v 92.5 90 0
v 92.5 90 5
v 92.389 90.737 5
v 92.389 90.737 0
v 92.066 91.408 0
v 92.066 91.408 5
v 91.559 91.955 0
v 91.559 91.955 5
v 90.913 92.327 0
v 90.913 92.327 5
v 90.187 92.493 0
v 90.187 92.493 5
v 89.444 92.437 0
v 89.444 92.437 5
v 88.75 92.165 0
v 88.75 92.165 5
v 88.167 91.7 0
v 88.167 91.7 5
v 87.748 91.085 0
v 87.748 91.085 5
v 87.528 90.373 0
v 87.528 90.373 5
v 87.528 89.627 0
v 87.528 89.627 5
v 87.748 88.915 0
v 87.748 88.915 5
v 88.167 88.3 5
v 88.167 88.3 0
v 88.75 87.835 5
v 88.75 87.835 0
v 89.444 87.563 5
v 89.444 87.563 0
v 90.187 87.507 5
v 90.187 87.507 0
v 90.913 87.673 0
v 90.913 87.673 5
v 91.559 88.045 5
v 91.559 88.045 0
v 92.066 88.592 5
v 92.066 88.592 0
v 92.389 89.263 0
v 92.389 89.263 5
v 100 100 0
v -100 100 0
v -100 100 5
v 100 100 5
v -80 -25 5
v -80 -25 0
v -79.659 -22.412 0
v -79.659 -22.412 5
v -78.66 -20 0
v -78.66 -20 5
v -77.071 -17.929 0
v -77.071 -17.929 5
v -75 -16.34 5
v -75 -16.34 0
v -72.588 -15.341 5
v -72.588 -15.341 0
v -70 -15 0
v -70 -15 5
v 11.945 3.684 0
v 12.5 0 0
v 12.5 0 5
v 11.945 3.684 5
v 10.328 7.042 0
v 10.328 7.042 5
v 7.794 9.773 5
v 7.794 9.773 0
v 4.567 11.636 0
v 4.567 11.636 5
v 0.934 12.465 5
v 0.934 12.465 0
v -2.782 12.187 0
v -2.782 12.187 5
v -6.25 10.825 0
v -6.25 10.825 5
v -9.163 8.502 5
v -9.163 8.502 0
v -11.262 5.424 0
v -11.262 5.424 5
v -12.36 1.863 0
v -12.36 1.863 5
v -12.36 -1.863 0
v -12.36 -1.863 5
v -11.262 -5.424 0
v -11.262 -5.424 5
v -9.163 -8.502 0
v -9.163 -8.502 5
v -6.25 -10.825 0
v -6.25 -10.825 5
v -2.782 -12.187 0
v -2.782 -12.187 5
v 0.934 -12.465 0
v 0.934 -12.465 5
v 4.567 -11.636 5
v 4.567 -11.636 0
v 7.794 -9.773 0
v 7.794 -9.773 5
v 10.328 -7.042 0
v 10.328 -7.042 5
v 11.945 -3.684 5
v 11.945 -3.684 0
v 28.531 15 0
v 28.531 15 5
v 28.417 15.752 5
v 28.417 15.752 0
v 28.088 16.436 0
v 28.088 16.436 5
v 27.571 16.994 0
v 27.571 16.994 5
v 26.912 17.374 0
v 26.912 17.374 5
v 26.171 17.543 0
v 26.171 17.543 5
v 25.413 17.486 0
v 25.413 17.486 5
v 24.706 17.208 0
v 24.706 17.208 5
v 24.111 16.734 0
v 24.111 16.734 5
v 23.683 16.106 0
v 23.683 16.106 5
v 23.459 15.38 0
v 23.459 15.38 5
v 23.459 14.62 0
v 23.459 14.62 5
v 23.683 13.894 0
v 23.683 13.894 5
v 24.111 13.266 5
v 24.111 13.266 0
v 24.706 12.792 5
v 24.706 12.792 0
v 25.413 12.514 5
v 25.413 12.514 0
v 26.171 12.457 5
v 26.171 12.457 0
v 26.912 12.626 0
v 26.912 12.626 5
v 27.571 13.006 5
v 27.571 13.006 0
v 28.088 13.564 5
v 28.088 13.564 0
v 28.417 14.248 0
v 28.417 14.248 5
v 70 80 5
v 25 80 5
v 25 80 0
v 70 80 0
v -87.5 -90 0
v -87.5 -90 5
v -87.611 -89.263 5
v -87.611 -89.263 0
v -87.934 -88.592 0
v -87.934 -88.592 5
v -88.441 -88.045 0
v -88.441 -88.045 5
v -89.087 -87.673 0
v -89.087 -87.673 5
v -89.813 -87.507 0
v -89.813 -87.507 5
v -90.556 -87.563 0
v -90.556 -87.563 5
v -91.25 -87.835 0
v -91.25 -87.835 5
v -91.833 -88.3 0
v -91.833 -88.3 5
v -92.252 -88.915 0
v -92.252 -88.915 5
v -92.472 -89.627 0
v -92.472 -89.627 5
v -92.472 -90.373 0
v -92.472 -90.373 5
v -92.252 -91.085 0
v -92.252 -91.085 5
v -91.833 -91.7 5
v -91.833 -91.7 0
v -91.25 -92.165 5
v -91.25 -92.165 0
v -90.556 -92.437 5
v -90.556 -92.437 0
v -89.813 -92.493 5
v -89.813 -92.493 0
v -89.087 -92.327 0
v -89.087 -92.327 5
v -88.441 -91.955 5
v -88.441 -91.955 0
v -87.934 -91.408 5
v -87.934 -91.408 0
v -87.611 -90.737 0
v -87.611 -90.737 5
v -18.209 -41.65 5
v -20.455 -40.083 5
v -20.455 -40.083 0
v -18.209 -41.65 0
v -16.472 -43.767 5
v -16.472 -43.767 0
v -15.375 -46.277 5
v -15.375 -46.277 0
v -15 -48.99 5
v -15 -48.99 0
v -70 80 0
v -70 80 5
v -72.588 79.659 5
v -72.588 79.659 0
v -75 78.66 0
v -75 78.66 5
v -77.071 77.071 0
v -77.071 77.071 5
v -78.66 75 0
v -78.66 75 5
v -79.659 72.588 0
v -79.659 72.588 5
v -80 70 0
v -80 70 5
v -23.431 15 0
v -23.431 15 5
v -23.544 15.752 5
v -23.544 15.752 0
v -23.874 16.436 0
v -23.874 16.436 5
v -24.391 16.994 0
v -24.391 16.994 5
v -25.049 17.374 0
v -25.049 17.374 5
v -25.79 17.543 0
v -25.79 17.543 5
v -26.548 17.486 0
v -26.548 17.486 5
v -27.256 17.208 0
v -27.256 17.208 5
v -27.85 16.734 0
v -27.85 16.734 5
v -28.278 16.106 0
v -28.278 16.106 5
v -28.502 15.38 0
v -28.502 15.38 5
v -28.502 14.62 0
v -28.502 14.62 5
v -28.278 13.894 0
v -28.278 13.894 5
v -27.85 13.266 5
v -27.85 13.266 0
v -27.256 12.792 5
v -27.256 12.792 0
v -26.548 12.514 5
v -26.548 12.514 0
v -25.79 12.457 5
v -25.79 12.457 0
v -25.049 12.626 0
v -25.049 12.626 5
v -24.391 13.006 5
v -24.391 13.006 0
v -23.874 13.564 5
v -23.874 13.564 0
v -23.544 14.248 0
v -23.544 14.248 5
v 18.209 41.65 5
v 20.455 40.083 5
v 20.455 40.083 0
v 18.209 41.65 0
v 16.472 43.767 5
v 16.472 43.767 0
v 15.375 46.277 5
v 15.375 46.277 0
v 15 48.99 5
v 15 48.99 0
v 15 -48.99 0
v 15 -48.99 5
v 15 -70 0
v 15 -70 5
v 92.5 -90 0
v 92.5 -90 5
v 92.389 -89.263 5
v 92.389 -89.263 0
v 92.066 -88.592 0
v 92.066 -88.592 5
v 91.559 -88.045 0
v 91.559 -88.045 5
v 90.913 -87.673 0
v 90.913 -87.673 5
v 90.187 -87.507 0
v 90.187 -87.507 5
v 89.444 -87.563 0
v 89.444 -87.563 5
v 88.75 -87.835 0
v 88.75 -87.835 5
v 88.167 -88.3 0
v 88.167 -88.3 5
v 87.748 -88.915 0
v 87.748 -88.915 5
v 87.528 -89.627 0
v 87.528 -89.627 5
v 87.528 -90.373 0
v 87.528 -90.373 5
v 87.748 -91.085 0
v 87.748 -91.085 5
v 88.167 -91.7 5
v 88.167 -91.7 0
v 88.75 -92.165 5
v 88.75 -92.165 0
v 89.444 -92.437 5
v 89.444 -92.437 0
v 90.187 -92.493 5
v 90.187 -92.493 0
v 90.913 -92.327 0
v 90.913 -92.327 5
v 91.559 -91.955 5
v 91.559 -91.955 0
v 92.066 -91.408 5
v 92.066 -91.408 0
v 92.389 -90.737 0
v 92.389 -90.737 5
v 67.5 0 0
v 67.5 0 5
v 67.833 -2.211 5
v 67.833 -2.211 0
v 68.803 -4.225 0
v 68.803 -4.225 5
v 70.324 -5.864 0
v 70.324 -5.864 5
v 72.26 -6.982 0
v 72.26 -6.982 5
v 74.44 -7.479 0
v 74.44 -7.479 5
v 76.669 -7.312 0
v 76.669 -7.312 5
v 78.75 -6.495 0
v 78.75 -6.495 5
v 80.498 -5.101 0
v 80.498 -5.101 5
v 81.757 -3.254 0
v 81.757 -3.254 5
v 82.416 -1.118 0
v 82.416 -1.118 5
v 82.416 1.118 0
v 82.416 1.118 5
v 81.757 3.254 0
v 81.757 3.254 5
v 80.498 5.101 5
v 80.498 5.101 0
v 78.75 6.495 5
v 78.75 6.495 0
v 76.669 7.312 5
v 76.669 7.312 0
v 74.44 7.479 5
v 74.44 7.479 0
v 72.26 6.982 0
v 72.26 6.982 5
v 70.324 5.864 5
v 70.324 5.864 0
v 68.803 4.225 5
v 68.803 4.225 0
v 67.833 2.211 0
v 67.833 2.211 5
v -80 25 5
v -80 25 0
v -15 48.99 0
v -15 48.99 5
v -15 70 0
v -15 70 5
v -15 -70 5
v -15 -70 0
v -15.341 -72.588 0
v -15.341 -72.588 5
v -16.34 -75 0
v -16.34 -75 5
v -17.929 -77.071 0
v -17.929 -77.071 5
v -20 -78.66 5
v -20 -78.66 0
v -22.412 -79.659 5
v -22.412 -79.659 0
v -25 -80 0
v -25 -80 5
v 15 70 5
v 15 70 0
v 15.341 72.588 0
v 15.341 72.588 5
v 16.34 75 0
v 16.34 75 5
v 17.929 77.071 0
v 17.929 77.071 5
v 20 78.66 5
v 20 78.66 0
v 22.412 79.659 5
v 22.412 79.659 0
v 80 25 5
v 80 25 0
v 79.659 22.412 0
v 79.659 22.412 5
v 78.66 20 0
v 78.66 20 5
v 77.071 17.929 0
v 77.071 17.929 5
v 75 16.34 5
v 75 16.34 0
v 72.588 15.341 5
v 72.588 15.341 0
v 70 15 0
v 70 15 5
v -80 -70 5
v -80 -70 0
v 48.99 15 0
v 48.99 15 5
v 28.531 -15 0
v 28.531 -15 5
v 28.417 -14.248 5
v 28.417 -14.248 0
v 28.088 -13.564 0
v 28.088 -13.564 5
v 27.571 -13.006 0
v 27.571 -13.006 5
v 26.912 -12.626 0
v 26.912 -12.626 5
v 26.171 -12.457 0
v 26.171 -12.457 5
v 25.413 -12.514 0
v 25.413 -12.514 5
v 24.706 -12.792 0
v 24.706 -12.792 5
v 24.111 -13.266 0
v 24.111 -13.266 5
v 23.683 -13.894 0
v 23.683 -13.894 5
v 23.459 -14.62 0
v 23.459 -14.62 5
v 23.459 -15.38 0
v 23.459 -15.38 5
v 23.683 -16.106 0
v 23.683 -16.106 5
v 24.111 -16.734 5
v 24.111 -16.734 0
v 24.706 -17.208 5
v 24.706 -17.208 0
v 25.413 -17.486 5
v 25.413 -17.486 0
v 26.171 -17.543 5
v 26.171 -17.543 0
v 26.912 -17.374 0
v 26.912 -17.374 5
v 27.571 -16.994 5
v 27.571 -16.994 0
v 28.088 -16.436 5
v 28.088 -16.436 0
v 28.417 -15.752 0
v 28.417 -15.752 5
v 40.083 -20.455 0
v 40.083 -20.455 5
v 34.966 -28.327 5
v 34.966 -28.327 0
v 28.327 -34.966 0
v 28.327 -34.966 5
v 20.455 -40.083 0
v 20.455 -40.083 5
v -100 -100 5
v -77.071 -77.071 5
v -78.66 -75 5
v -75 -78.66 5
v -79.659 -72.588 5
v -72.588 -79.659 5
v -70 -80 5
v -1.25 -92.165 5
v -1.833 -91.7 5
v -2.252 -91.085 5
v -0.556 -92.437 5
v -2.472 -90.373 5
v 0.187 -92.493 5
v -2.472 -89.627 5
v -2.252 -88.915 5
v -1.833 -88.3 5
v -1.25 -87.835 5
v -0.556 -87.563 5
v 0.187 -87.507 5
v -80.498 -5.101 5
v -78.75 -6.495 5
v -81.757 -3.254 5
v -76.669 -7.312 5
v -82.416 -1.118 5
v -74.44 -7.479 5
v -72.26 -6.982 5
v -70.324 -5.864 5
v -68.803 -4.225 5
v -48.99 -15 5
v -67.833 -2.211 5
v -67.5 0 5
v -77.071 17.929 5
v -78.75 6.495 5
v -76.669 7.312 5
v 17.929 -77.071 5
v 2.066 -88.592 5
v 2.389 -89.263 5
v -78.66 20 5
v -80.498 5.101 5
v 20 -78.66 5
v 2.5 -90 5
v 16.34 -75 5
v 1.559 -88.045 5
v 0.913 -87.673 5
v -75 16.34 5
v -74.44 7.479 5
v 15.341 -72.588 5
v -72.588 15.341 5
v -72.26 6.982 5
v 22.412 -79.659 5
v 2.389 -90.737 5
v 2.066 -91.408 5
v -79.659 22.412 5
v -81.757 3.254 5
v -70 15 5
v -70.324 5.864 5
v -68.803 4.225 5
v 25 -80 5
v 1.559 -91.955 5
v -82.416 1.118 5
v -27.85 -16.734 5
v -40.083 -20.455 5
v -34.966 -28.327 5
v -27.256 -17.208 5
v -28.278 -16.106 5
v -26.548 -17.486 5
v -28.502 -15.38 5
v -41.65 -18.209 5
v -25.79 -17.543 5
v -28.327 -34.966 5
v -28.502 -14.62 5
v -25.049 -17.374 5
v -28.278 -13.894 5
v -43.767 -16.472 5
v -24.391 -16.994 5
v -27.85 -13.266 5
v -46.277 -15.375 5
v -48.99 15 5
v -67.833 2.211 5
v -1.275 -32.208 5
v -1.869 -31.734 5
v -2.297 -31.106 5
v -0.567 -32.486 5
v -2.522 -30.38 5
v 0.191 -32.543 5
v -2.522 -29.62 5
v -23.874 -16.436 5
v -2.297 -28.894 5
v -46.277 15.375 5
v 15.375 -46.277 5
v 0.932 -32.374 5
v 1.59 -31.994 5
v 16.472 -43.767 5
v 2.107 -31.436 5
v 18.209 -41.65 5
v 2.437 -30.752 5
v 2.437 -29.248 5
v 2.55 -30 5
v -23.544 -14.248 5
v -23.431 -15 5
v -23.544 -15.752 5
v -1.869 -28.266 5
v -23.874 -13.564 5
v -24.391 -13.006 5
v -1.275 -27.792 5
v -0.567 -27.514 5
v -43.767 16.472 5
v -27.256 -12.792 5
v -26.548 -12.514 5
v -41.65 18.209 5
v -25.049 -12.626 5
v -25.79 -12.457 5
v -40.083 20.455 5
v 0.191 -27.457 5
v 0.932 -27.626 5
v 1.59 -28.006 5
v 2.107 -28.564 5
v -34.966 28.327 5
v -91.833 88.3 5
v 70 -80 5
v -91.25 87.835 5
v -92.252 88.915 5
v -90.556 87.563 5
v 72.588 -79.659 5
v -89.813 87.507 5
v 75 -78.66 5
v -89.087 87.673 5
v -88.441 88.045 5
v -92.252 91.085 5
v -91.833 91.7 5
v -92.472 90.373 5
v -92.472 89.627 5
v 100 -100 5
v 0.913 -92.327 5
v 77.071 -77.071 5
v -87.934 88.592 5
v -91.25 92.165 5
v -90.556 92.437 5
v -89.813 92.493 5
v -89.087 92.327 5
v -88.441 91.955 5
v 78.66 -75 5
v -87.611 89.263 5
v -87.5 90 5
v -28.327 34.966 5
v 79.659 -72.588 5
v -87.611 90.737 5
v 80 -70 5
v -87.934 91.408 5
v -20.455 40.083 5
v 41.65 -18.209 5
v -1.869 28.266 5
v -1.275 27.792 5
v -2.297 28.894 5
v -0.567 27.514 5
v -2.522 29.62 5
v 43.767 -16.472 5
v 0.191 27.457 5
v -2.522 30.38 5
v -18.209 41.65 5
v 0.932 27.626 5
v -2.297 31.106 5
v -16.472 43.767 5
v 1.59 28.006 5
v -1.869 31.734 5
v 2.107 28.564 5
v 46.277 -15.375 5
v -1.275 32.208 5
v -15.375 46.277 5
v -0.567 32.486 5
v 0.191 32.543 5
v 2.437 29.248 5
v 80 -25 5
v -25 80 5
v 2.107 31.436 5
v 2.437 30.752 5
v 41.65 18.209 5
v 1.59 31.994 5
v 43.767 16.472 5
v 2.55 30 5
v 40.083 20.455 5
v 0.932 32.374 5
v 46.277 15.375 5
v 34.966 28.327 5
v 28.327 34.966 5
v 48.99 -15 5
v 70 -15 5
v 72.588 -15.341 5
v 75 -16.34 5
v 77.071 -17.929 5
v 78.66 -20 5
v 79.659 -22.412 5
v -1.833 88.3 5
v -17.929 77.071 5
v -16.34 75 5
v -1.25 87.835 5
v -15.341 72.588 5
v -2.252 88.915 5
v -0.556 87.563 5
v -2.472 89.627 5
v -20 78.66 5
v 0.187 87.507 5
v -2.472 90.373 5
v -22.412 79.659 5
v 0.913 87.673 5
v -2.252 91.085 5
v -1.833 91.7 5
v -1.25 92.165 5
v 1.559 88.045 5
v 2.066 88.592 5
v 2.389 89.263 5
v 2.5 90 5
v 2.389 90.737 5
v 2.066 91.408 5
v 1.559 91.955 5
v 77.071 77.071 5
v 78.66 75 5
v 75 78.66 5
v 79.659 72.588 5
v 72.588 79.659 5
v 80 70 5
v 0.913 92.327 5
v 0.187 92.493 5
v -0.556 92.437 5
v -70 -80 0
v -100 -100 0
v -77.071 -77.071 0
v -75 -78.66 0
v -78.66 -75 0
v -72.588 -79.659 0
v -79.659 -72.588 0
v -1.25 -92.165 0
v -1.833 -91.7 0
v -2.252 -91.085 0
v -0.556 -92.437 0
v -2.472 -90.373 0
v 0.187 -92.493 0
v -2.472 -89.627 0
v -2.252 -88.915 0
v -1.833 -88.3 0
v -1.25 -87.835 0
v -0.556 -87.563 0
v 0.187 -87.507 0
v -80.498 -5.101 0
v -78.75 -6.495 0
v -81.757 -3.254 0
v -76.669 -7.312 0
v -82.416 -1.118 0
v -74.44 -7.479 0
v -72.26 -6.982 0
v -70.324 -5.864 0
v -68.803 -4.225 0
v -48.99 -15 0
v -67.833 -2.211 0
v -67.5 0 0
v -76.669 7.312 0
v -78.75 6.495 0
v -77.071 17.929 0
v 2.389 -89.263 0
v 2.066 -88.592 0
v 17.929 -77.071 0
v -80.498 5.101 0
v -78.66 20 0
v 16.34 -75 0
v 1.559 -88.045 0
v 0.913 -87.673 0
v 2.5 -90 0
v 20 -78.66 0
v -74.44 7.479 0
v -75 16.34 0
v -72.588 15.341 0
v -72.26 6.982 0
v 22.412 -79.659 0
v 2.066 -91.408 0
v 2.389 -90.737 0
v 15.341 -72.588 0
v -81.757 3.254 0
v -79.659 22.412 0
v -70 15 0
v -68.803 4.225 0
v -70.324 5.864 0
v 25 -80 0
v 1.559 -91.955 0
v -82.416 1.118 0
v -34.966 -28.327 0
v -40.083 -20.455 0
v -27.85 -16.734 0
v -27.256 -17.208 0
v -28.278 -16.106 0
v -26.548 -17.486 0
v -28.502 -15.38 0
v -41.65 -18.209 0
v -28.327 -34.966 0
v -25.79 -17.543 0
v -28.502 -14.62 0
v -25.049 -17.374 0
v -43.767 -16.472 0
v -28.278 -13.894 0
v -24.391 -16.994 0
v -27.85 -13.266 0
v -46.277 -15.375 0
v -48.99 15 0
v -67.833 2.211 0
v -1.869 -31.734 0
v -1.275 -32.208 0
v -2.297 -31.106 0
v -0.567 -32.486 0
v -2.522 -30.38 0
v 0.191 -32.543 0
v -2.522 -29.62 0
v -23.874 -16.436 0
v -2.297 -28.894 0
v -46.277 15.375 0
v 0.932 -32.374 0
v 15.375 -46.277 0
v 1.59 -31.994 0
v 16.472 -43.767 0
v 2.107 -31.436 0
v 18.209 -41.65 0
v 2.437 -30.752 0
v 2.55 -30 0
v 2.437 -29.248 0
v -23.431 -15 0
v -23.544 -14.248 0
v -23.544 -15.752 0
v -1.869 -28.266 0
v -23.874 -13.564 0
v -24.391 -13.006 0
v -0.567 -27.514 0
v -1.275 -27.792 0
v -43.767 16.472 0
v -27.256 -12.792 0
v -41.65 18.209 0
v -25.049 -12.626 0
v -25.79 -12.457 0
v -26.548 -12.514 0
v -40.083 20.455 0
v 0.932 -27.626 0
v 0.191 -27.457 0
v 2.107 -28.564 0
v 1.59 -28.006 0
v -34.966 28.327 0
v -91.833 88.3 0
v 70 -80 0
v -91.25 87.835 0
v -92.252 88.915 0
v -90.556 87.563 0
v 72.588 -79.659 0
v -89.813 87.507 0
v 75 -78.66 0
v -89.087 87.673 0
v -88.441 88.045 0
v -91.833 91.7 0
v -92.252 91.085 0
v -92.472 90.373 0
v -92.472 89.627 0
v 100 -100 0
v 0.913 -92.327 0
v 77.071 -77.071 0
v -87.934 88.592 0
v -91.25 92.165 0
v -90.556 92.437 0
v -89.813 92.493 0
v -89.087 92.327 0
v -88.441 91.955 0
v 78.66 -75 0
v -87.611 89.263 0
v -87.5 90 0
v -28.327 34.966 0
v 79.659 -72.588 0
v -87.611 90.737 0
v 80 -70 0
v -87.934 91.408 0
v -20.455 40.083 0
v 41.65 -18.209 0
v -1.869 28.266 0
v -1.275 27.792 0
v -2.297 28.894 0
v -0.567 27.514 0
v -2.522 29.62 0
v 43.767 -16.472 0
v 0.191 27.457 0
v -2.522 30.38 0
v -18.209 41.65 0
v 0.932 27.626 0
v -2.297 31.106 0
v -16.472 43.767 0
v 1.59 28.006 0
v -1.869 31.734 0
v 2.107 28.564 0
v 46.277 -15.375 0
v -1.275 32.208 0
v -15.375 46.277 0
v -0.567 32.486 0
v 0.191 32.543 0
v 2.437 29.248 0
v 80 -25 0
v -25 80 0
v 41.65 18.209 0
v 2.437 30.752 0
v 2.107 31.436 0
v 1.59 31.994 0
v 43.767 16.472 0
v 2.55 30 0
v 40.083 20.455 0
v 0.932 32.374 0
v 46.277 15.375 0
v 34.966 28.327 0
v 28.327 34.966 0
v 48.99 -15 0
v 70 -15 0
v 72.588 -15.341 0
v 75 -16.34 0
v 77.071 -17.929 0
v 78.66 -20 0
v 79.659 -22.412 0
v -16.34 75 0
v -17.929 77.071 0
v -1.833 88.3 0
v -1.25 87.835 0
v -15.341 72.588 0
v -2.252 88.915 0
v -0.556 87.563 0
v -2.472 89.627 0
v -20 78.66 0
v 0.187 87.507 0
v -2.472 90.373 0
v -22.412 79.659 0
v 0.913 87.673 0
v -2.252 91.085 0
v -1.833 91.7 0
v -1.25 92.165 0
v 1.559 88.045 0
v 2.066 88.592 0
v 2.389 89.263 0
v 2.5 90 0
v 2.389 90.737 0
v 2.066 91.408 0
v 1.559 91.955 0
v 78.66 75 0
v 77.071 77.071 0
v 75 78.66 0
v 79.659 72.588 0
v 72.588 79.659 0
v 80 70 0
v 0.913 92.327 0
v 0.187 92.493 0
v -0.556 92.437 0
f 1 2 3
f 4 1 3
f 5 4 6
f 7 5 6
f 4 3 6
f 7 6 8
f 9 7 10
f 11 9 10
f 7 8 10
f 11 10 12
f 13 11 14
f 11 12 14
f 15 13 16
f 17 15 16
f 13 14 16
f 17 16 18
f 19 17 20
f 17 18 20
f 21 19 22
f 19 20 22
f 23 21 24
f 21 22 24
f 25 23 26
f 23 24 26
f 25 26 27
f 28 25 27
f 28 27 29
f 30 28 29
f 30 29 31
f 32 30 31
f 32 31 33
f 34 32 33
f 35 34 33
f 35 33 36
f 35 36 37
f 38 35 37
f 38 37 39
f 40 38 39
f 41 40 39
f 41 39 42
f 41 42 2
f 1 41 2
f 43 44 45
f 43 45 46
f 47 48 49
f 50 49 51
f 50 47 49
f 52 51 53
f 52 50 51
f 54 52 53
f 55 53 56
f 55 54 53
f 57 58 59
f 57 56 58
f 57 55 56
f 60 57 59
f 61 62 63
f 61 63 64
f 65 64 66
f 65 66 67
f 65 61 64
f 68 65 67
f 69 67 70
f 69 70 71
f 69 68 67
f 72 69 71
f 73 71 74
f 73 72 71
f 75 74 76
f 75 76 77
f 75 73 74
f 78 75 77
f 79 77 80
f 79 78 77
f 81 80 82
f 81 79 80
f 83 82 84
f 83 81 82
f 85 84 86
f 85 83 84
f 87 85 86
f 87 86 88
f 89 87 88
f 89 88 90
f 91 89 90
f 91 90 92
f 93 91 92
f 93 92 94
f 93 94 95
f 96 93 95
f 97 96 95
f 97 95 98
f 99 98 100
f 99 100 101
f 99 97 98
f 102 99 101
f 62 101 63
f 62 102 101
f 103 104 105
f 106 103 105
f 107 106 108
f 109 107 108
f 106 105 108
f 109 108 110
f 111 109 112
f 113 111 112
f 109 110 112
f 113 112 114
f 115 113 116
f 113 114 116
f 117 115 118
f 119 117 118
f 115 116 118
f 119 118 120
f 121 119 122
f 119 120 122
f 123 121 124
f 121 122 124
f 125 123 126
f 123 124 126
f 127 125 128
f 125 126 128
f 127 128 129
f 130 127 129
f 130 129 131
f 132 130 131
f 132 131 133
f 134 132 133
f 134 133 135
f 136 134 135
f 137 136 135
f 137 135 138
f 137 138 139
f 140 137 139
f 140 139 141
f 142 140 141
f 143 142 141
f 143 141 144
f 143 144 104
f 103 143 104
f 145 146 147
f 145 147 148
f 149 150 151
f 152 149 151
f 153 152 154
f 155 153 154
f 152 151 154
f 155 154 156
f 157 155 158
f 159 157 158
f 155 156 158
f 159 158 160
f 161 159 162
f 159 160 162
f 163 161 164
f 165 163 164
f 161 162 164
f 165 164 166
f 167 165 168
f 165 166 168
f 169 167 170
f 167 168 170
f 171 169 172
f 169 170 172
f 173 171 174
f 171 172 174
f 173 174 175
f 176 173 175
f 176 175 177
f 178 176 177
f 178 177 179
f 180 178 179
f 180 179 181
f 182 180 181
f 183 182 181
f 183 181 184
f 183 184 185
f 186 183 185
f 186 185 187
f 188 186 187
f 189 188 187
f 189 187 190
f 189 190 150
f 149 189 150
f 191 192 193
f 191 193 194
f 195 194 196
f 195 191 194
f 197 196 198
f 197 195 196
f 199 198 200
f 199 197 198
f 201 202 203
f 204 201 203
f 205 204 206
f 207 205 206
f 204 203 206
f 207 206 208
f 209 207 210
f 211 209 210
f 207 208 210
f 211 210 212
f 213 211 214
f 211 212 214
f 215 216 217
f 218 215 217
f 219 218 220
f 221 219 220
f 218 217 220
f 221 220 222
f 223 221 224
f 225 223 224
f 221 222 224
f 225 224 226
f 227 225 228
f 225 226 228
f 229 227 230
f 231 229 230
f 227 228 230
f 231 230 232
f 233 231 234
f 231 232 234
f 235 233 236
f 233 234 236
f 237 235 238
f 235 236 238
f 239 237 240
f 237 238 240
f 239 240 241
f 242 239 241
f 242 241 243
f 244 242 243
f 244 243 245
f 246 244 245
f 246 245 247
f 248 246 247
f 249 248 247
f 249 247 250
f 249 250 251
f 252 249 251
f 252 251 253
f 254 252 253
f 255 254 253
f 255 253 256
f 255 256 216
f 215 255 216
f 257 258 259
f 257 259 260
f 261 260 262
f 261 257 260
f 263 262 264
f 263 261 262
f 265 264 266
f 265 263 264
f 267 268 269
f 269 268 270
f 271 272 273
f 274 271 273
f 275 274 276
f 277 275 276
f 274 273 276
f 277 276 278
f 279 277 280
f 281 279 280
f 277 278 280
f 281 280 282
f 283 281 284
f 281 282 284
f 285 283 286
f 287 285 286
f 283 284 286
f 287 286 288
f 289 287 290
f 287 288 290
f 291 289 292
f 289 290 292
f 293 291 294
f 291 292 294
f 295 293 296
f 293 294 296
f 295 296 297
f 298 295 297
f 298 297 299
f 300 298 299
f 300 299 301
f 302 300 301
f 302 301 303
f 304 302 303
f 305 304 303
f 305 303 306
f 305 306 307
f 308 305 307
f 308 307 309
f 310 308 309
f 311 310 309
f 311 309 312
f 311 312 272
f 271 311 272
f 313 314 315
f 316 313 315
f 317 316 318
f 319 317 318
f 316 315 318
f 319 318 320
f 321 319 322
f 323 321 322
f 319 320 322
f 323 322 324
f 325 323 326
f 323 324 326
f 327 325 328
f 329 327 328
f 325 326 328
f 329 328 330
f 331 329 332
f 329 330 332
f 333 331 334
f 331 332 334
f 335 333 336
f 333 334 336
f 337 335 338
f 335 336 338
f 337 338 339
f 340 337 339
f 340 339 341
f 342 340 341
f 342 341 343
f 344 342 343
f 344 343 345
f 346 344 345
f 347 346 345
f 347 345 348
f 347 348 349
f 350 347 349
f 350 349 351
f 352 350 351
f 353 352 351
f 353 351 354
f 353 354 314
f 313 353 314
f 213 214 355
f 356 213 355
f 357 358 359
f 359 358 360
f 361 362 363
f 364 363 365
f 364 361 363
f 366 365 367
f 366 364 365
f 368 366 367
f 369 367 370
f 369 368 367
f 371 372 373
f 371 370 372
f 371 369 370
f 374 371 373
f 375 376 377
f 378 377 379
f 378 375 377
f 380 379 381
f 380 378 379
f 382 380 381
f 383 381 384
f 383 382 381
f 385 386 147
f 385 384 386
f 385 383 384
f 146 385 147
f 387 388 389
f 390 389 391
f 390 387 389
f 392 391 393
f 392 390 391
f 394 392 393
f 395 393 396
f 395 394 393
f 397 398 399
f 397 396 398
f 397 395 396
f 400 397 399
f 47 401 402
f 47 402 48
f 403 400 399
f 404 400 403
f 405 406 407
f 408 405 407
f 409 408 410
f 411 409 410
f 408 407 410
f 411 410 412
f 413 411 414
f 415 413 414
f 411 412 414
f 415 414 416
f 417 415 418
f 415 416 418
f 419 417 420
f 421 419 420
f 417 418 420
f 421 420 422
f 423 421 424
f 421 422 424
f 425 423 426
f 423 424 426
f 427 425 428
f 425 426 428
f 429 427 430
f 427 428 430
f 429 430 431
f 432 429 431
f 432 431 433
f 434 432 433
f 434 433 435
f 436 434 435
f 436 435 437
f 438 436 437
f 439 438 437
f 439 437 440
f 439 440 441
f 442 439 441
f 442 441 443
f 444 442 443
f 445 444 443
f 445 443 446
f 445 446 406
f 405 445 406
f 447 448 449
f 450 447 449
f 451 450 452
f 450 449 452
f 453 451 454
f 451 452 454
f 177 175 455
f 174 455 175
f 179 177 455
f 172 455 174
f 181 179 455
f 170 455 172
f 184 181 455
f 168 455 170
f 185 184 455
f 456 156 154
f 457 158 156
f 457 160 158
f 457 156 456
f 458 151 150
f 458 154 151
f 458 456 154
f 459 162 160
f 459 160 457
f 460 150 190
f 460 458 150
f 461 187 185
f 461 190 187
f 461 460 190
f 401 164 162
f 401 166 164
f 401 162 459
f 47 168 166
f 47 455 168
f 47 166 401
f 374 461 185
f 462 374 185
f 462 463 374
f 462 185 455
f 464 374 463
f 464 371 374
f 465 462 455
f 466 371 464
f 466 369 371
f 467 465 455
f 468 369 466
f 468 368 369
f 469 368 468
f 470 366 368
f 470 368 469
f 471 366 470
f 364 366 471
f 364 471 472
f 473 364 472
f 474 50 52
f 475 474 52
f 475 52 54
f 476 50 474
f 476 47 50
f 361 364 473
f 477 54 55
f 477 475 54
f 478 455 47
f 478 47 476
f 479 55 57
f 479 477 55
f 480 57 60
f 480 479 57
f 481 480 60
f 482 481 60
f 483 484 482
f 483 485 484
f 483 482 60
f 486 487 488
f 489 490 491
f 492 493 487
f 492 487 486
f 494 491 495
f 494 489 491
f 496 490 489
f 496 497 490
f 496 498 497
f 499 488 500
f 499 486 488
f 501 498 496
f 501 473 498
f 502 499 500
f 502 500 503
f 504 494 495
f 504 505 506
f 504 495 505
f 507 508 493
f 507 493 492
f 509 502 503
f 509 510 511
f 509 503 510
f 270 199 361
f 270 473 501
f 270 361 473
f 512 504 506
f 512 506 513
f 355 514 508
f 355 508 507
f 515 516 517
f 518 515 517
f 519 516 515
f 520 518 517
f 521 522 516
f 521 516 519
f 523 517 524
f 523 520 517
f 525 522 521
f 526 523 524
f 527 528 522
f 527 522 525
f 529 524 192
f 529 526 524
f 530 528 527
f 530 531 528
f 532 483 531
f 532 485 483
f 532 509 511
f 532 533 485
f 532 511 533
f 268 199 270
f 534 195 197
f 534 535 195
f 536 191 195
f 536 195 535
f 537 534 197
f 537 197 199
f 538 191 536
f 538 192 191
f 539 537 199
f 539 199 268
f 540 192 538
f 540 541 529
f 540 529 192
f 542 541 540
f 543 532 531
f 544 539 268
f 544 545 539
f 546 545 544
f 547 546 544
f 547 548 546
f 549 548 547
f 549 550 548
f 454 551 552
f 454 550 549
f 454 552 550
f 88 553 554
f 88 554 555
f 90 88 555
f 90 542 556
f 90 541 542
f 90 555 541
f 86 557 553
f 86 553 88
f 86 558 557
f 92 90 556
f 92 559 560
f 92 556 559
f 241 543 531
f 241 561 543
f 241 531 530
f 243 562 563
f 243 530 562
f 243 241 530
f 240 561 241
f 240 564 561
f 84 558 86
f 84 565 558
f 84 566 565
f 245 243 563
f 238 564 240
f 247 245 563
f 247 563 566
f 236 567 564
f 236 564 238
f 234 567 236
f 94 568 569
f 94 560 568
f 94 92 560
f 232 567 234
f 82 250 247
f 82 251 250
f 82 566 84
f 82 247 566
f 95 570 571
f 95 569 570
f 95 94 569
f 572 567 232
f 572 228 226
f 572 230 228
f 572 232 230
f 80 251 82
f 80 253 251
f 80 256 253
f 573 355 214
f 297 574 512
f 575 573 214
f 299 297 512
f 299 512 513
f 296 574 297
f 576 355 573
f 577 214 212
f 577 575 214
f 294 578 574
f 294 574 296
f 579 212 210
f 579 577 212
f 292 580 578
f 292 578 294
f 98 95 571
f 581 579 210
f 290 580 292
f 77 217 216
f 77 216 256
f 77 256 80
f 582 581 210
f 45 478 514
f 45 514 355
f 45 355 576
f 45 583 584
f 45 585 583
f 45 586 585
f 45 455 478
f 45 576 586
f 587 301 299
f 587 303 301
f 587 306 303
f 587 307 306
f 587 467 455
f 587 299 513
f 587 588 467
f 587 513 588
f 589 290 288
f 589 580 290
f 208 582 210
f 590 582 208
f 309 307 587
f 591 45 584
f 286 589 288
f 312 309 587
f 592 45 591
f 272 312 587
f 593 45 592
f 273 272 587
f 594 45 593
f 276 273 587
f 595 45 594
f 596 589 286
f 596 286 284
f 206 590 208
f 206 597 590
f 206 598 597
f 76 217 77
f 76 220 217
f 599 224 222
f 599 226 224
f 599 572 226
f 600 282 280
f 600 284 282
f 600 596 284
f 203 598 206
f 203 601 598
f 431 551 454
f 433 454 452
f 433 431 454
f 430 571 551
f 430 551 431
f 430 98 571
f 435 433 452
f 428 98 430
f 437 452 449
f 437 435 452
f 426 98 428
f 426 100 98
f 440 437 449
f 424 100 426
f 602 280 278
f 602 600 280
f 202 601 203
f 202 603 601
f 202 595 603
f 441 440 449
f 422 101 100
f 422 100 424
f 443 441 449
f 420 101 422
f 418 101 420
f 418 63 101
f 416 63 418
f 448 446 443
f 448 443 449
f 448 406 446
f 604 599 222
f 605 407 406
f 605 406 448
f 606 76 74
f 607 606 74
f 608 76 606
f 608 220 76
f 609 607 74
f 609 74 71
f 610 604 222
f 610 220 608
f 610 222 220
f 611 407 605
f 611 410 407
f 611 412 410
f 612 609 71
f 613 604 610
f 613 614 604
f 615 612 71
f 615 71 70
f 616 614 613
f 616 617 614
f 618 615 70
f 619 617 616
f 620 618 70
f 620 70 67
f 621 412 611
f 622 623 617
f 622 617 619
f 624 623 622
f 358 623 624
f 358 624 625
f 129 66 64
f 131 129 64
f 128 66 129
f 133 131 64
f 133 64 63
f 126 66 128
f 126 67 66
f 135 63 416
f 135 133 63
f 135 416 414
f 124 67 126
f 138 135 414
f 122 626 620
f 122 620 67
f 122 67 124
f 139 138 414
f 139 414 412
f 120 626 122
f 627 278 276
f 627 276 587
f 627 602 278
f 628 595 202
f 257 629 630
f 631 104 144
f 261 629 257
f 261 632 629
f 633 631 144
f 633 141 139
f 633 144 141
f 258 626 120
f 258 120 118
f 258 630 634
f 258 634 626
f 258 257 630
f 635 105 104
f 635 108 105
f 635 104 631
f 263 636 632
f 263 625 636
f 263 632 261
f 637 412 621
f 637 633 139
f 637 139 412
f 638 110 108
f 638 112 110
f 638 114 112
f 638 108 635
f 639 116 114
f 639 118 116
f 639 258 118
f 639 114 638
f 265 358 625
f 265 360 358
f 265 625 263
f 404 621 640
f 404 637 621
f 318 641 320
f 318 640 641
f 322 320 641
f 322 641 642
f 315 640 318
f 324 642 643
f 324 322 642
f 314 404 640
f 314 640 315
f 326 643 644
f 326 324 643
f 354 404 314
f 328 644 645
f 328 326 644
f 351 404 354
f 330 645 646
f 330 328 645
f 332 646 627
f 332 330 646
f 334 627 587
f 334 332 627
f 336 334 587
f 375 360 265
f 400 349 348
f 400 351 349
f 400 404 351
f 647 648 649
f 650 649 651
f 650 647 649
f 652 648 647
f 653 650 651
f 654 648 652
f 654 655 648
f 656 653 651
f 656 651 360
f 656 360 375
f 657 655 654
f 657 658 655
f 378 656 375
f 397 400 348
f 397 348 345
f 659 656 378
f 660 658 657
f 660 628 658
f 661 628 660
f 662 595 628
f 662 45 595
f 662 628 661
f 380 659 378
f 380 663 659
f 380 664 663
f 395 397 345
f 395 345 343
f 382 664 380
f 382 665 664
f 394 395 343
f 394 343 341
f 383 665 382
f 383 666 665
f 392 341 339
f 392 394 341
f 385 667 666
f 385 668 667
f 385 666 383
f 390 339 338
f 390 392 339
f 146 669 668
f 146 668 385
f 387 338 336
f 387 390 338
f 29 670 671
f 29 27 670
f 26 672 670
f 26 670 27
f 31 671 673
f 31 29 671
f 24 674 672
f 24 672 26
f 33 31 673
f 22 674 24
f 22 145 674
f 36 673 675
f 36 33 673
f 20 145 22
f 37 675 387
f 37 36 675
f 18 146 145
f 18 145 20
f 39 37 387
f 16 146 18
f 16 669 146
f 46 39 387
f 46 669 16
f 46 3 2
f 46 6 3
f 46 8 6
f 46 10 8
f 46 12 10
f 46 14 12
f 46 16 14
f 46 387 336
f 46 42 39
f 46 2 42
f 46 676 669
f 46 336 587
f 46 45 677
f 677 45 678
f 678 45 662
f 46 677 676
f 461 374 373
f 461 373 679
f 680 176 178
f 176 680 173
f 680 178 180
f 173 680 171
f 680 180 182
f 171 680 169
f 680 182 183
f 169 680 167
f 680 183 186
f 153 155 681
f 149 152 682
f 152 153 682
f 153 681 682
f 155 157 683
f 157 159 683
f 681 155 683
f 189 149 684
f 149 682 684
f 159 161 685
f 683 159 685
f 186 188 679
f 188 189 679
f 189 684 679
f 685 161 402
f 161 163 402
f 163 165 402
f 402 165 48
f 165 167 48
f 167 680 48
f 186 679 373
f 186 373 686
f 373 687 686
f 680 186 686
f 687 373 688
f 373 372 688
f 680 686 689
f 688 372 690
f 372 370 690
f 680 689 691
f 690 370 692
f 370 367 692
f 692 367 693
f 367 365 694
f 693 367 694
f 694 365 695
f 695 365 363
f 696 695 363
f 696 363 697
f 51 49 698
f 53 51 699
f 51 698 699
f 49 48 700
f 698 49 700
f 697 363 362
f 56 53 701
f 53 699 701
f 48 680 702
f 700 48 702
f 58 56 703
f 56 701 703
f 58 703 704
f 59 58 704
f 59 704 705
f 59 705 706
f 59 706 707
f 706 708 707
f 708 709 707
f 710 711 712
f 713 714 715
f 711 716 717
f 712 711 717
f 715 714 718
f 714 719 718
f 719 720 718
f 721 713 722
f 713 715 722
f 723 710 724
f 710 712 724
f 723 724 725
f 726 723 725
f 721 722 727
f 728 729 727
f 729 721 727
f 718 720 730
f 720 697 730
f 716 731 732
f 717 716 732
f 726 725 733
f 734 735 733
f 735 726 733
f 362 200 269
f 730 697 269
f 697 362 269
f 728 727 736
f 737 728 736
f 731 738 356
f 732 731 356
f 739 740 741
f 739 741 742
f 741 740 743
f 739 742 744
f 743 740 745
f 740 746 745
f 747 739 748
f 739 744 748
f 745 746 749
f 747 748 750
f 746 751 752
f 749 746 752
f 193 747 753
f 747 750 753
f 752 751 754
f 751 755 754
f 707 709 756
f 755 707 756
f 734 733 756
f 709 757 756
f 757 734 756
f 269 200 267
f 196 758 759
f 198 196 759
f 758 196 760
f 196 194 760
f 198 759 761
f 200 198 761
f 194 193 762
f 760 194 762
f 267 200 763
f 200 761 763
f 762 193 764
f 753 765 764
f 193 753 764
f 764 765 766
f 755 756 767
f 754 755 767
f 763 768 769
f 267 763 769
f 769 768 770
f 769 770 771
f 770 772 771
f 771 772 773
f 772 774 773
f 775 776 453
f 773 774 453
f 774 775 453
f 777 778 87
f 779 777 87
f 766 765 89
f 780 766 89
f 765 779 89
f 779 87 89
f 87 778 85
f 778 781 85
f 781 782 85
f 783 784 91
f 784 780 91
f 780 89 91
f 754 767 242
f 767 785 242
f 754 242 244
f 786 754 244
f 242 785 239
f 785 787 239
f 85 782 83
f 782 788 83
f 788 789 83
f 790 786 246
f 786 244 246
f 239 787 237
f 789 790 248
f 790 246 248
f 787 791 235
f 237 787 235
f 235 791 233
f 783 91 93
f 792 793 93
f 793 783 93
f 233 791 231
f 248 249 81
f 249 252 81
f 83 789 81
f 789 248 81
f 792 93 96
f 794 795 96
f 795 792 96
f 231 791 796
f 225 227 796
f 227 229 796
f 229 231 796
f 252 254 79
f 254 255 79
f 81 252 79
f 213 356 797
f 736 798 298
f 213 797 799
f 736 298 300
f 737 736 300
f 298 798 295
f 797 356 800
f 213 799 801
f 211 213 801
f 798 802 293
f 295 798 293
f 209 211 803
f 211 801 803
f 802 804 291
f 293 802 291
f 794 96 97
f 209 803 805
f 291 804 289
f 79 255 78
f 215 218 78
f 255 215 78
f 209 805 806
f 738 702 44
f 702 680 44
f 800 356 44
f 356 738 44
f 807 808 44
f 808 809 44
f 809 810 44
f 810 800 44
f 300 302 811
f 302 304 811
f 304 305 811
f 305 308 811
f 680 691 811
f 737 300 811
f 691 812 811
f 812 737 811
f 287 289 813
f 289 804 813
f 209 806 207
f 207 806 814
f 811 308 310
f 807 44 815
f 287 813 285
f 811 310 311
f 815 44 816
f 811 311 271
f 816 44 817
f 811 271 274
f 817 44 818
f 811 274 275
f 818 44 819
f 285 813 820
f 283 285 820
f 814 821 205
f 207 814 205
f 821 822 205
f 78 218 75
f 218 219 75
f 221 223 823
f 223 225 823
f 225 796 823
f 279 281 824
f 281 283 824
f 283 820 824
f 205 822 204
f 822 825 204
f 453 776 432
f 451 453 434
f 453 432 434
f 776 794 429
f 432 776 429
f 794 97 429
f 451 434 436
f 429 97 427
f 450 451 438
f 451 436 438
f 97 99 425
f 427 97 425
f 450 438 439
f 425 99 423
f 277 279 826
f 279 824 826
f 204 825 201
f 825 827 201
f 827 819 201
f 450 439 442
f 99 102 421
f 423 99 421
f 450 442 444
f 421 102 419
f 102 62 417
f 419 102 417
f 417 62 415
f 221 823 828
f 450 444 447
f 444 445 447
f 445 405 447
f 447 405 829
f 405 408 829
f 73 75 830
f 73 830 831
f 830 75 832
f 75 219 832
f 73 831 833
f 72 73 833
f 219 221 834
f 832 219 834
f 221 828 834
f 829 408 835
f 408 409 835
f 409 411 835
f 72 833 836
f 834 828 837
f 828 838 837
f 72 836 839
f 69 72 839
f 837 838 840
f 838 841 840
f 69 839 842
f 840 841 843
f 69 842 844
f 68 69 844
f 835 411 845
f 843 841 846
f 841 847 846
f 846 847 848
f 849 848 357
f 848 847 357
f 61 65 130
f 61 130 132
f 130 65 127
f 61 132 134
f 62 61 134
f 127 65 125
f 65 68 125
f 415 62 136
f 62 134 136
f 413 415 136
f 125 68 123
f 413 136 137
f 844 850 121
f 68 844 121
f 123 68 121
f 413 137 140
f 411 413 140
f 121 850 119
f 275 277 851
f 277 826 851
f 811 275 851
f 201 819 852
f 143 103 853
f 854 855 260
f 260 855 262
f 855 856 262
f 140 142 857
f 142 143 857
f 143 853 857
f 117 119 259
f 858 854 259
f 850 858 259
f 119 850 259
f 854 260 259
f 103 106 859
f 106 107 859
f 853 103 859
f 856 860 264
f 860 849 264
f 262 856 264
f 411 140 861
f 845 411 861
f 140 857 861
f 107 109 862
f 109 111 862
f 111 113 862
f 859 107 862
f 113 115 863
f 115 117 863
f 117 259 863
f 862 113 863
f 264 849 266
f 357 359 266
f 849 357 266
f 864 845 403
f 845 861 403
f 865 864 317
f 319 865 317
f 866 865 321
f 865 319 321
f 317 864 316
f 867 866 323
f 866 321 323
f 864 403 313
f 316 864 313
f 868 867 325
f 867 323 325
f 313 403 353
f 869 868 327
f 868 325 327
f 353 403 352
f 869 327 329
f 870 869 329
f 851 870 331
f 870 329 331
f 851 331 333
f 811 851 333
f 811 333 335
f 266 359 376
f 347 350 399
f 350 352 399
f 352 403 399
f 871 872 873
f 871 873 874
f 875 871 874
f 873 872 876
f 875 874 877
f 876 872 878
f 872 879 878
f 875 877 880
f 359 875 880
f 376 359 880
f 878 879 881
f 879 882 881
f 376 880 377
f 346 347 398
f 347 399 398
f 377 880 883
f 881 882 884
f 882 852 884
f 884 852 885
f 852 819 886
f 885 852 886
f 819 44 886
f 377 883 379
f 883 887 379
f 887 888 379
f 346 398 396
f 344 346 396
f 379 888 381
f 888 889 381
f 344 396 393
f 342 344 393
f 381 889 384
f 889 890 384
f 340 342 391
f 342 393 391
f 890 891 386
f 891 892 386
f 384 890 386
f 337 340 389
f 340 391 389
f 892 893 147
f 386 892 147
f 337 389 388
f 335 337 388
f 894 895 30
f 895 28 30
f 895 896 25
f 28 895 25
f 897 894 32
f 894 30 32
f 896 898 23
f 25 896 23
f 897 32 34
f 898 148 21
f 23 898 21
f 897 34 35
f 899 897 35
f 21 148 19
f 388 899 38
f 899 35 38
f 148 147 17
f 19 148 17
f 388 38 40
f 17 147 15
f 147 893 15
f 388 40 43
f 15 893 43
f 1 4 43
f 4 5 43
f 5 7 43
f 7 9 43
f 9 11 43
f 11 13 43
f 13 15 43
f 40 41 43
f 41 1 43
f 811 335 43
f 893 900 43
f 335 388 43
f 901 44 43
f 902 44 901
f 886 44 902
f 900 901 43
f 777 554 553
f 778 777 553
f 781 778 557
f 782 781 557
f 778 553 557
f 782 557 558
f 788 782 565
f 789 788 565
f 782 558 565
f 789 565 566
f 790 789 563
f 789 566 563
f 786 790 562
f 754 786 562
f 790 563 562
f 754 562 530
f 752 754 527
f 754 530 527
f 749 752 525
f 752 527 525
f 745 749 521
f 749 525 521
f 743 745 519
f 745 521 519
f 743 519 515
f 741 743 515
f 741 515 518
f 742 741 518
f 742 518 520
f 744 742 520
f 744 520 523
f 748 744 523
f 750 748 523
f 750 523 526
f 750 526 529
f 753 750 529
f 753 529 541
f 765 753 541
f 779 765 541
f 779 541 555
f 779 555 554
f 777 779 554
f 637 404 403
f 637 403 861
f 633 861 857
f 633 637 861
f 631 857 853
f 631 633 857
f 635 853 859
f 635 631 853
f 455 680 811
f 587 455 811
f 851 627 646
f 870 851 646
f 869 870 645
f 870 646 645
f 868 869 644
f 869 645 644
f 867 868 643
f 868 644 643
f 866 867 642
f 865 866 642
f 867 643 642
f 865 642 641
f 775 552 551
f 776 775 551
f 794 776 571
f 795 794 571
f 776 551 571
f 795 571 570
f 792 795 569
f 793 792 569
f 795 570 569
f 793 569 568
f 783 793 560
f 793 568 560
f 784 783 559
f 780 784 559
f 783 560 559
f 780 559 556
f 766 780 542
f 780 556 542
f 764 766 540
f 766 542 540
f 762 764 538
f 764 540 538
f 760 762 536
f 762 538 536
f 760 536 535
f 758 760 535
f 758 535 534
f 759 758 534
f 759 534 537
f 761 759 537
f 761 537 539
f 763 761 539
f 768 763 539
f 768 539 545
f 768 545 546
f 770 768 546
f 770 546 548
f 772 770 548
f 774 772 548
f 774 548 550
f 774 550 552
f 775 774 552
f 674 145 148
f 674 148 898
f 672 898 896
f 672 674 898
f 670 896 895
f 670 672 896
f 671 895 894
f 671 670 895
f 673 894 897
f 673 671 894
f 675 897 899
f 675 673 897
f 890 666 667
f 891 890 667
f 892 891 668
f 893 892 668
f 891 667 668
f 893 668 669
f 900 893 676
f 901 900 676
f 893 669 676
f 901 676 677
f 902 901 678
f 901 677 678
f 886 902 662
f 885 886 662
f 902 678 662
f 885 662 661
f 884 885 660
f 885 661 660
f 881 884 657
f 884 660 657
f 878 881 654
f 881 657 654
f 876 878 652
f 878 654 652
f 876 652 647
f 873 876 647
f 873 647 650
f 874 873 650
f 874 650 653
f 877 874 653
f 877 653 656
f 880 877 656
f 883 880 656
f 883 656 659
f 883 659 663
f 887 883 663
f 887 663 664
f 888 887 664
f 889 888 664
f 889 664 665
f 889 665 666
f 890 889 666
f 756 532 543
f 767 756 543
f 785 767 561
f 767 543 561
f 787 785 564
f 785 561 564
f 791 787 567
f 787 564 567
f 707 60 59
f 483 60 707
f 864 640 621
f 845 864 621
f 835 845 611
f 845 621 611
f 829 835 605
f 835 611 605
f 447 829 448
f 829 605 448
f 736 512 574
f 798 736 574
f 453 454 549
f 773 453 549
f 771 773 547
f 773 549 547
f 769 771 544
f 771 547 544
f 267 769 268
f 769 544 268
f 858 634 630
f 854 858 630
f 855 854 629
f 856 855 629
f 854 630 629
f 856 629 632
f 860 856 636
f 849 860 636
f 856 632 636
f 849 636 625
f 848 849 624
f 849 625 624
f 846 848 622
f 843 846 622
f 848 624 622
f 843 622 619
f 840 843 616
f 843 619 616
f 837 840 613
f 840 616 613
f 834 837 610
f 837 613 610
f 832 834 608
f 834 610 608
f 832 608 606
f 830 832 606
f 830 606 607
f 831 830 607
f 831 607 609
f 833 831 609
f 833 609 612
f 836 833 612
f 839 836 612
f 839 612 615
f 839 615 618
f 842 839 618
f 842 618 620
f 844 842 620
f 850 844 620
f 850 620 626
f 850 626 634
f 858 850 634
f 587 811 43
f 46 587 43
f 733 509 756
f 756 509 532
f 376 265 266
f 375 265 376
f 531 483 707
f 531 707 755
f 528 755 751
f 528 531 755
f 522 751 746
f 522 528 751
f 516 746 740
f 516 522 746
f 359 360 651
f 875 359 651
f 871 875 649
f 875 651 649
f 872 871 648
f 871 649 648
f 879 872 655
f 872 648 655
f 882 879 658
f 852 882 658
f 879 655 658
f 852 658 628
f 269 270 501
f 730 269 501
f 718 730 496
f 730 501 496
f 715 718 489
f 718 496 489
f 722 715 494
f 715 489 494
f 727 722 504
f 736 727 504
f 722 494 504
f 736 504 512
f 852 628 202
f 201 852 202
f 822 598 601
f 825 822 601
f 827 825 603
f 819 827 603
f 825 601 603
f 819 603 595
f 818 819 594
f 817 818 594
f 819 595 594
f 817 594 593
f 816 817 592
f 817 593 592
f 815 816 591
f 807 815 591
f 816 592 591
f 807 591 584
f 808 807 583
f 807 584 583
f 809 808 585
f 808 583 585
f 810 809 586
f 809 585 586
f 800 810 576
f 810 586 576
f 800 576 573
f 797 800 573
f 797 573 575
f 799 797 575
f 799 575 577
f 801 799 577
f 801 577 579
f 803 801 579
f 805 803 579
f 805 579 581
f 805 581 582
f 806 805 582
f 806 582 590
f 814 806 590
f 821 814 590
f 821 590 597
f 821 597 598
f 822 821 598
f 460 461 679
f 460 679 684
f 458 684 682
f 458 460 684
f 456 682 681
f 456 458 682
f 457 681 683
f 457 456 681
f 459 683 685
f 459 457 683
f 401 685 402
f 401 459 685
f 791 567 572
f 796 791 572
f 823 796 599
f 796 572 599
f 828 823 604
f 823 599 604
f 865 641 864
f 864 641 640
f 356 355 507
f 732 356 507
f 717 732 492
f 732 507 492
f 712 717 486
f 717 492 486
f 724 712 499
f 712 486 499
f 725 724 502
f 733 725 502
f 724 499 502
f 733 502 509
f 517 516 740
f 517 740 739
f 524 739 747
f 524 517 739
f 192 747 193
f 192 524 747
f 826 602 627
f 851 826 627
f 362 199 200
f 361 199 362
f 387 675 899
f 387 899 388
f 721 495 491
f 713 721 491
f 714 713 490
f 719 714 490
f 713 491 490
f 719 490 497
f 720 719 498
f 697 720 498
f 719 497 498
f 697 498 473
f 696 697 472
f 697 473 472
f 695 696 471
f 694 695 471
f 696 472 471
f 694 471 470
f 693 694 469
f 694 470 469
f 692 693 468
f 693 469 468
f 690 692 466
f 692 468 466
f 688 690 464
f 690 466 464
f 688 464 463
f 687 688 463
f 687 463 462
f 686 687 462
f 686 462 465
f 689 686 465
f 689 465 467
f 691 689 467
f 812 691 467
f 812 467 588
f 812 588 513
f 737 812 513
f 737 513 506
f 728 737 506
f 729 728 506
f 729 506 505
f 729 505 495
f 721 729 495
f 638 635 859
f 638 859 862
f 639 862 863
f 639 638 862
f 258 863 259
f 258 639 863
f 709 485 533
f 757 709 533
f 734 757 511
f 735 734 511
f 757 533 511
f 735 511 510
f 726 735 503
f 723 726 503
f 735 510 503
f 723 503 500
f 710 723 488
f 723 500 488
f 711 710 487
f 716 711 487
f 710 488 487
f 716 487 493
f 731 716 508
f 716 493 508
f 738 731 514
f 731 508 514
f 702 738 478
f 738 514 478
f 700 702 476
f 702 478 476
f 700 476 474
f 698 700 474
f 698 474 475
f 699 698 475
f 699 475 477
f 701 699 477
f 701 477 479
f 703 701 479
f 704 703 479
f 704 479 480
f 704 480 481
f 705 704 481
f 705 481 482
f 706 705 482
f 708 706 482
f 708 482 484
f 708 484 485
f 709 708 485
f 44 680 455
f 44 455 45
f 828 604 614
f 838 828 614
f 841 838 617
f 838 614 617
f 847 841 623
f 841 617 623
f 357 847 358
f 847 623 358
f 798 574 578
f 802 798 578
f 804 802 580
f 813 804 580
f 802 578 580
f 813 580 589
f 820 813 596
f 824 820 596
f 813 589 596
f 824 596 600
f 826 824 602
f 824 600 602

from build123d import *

# Parameters (mm, degrees)
SKETCH_1_W          = 200
SKETCH_1_H          = 200
SKETCH_1_R          = 12.5
EXTRUDE_1_DEPTH     = 5
SKETCH_3_R          = 2.5
CUT_EXTRUDE_2_DEPTH = 142.509716981
SKETCH_4_R          = 2.55
SKETCH_4_R_2        = 7.5
CUT_EXTRUDE_3_DEPTH = 142.509716981
CUT_EXTRUDE_4_DEPTH = 142.509716981


with BuildPart() as part:
    # ｽｹｯﾁ1 → ﾎﾞｽ - 押し出し1 (new body)
    with BuildSketch(Plane.XY):
        Rectangle(SKETCH_1_W, SKETCH_1_H)
        Circle(SKETCH_1_R, mode=Mode.SUBTRACT)
    extrude(amount=EXTRUDE_1_DEPTH)

    # ｽｹｯﾁ3 → ｶｯﾄ - 押し出し2 (cut, through all)
    with BuildSketch(Plane.XY.offset(5)):
        with Locations((0, 90)):
            Circle(SKETCH_3_R)
        with Locations((90, 90)):
            Circle(SKETCH_3_R)
        with Locations((-90, 90)):
            Circle(SKETCH_3_R)
        with Locations((-90, -90)):
            Circle(SKETCH_3_R)
        with Locations((0, -90)):
            Circle(SKETCH_3_R)
        with Locations((90, -90)):
            Circle(SKETCH_3_R)
    extrude(amount=-CUT_EXTRUDE_2_DEPTH, mode=Mode.SUBTRACT)

    # ｽｹｯﾁ4 → ｶｯﾄ - 押し出し3 (cut, through all)
    with BuildSketch(Plane.XY.offset(5)):
        with Locations((0, 30)):
            Circle(SKETCH_4_R)
        with Locations((25.980762114, 15)):
            Circle(SKETCH_4_R)
        with Locations((25.980762114, -15)):
            Circle(SKETCH_4_R)
        with Locations((0, -30)):
            Circle(SKETCH_4_R)
        with Locations((-25.980762114, -15)):
            Circle(SKETCH_4_R)
        with Locations((-25.980762114, 15)):
            Circle(SKETCH_4_R)
        with Locations((-75, 0)):
            Circle(SKETCH_4_R_2)
        with Locations(Location((75, 0, 0), (0, 0, 180))):
            Circle(SKETCH_4_R_2)
    extrude(amount=-CUT_EXTRUDE_3_DEPTH, mode=Mode.SUBTRACT)

    # ｽｹｯﾁ5 → ｶｯﾄ - 押し出し4 (cut, through all)
    with BuildSketch(Plane.XY.offset(5)):
        with BuildLine():
            Line((-80, 70), (-80, 25))
            ThreePointArc((-80, 25), (-77.071067812, 17.928932188), (-70, 15))
            Line((-70, 15), (-48.989794856, 15))
            ThreePointArc((-48.989794856, 15), (-43.767465177, 16.471971346), (-40.082559427, 20.454545455))
            ThreePointArc((-40.082559427, 20.454545455), (-31.819805153, 31.819805153), (-20.454545455, 40.082559427))
            ThreePointArc((-20.454545455, 40.082559427), (-16.471971346, 43.767465177), (-15, 48.989794856))
            Line((-15, 48.989794856), (-15, 70))
            ThreePointArc((-15, 70), (-17.928932188, 77.071067812), (-25, 80))
            Line((-25, 80), (-70, 80))
            ThreePointArc((-70, 80), (-77.071067812, 77.071067812), (-80, 70))
        make_face()
        with BuildLine():
            Line((15, 48.989794856), (15, 70))
            ThreePointArc((15, 70), (17.928932188, 77.071067812), (25, 80))
            Line((25, 80), (70, 80))
            ThreePointArc((70, 80), (77.071067812, 77.071067812), (80, 70))
            Line((80, 70), (80, 25))
            ThreePointArc((80, 25), (77.071067812, 17.928932188), (70, 15))
            Line((70, 15), (48.989794856, 15))
            ThreePointArc((48.989794856, 15), (43.767465177, 16.471971346), (40.082559427, 20.454545455))
            ThreePointArc((40.082559427, 20.454545455), (31.819805153, 31.819805153), (20.454545455, 40.082559427))
            ThreePointArc((20.454545455, 40.082559427), (16.471971346, 43.767465177), (15, 48.989794856))
        make_face()
        with BuildLine():
            Line((15, -48.989794856), (15, -70))
            ThreePointArc((15, -70), (17.928932188, -77.071067812), (25, -80))
            Line((25, -80), (70, -80))
            ThreePointArc((70, -80), (77.071067812, -77.071067812), (80, -70))
            Line((80, -70), (80, -25))
            ThreePointArc((80, -25), (77.071067812, -17.928932188), (70, -15))
            Line((70, -15), (48.989794856, -15))
            ThreePointArc((48.989794856, -15), (43.767465177, -16.471971346), (40.082559427, -20.454545455))
            ThreePointArc((40.082559427, -20.454545455), (31.819805153, -31.819805153), (20.454545455, -40.082559427))
            ThreePointArc((20.454545455, -40.082559427), (16.471971346, -43.767465177), (15, -48.989794856))
        make_face()
        with BuildLine():
            Line((-15, -48.989794856), (-15, -70))
            ThreePointArc((-15, -70), (-17.928932188, -77.071067812), (-25, -80))
            Line((-25, -80), (-70, -80))
            ThreePointArc((-70, -80), (-77.071067812, -77.071067812), (-80, -70))
            Line((-80, -70), (-80, -25))
            ThreePointArc((-80, -25), (-77.071067812, -17.928932188), (-70, -15))
            Line((-70, -15), (-48.989794856, -15))
            ThreePointArc((-48.989794856, -15), (-43.767465177, -16.471971346), (-40.082559427, -20.454545455))
            ThreePointArc((-40.082559427, -20.454545455), (-31.819805153, -31.819805153), (-20.454545455, -40.082559427))
            ThreePointArc((-20.454545455, -40.082559427), (-16.471971346, -43.767465177), (-15, -48.989794856))
        make_face()
    extrude(amount=-CUT_EXTRUDE_4_DEPTH, mode=Mode.SUBTRACT)


solid = part.part
